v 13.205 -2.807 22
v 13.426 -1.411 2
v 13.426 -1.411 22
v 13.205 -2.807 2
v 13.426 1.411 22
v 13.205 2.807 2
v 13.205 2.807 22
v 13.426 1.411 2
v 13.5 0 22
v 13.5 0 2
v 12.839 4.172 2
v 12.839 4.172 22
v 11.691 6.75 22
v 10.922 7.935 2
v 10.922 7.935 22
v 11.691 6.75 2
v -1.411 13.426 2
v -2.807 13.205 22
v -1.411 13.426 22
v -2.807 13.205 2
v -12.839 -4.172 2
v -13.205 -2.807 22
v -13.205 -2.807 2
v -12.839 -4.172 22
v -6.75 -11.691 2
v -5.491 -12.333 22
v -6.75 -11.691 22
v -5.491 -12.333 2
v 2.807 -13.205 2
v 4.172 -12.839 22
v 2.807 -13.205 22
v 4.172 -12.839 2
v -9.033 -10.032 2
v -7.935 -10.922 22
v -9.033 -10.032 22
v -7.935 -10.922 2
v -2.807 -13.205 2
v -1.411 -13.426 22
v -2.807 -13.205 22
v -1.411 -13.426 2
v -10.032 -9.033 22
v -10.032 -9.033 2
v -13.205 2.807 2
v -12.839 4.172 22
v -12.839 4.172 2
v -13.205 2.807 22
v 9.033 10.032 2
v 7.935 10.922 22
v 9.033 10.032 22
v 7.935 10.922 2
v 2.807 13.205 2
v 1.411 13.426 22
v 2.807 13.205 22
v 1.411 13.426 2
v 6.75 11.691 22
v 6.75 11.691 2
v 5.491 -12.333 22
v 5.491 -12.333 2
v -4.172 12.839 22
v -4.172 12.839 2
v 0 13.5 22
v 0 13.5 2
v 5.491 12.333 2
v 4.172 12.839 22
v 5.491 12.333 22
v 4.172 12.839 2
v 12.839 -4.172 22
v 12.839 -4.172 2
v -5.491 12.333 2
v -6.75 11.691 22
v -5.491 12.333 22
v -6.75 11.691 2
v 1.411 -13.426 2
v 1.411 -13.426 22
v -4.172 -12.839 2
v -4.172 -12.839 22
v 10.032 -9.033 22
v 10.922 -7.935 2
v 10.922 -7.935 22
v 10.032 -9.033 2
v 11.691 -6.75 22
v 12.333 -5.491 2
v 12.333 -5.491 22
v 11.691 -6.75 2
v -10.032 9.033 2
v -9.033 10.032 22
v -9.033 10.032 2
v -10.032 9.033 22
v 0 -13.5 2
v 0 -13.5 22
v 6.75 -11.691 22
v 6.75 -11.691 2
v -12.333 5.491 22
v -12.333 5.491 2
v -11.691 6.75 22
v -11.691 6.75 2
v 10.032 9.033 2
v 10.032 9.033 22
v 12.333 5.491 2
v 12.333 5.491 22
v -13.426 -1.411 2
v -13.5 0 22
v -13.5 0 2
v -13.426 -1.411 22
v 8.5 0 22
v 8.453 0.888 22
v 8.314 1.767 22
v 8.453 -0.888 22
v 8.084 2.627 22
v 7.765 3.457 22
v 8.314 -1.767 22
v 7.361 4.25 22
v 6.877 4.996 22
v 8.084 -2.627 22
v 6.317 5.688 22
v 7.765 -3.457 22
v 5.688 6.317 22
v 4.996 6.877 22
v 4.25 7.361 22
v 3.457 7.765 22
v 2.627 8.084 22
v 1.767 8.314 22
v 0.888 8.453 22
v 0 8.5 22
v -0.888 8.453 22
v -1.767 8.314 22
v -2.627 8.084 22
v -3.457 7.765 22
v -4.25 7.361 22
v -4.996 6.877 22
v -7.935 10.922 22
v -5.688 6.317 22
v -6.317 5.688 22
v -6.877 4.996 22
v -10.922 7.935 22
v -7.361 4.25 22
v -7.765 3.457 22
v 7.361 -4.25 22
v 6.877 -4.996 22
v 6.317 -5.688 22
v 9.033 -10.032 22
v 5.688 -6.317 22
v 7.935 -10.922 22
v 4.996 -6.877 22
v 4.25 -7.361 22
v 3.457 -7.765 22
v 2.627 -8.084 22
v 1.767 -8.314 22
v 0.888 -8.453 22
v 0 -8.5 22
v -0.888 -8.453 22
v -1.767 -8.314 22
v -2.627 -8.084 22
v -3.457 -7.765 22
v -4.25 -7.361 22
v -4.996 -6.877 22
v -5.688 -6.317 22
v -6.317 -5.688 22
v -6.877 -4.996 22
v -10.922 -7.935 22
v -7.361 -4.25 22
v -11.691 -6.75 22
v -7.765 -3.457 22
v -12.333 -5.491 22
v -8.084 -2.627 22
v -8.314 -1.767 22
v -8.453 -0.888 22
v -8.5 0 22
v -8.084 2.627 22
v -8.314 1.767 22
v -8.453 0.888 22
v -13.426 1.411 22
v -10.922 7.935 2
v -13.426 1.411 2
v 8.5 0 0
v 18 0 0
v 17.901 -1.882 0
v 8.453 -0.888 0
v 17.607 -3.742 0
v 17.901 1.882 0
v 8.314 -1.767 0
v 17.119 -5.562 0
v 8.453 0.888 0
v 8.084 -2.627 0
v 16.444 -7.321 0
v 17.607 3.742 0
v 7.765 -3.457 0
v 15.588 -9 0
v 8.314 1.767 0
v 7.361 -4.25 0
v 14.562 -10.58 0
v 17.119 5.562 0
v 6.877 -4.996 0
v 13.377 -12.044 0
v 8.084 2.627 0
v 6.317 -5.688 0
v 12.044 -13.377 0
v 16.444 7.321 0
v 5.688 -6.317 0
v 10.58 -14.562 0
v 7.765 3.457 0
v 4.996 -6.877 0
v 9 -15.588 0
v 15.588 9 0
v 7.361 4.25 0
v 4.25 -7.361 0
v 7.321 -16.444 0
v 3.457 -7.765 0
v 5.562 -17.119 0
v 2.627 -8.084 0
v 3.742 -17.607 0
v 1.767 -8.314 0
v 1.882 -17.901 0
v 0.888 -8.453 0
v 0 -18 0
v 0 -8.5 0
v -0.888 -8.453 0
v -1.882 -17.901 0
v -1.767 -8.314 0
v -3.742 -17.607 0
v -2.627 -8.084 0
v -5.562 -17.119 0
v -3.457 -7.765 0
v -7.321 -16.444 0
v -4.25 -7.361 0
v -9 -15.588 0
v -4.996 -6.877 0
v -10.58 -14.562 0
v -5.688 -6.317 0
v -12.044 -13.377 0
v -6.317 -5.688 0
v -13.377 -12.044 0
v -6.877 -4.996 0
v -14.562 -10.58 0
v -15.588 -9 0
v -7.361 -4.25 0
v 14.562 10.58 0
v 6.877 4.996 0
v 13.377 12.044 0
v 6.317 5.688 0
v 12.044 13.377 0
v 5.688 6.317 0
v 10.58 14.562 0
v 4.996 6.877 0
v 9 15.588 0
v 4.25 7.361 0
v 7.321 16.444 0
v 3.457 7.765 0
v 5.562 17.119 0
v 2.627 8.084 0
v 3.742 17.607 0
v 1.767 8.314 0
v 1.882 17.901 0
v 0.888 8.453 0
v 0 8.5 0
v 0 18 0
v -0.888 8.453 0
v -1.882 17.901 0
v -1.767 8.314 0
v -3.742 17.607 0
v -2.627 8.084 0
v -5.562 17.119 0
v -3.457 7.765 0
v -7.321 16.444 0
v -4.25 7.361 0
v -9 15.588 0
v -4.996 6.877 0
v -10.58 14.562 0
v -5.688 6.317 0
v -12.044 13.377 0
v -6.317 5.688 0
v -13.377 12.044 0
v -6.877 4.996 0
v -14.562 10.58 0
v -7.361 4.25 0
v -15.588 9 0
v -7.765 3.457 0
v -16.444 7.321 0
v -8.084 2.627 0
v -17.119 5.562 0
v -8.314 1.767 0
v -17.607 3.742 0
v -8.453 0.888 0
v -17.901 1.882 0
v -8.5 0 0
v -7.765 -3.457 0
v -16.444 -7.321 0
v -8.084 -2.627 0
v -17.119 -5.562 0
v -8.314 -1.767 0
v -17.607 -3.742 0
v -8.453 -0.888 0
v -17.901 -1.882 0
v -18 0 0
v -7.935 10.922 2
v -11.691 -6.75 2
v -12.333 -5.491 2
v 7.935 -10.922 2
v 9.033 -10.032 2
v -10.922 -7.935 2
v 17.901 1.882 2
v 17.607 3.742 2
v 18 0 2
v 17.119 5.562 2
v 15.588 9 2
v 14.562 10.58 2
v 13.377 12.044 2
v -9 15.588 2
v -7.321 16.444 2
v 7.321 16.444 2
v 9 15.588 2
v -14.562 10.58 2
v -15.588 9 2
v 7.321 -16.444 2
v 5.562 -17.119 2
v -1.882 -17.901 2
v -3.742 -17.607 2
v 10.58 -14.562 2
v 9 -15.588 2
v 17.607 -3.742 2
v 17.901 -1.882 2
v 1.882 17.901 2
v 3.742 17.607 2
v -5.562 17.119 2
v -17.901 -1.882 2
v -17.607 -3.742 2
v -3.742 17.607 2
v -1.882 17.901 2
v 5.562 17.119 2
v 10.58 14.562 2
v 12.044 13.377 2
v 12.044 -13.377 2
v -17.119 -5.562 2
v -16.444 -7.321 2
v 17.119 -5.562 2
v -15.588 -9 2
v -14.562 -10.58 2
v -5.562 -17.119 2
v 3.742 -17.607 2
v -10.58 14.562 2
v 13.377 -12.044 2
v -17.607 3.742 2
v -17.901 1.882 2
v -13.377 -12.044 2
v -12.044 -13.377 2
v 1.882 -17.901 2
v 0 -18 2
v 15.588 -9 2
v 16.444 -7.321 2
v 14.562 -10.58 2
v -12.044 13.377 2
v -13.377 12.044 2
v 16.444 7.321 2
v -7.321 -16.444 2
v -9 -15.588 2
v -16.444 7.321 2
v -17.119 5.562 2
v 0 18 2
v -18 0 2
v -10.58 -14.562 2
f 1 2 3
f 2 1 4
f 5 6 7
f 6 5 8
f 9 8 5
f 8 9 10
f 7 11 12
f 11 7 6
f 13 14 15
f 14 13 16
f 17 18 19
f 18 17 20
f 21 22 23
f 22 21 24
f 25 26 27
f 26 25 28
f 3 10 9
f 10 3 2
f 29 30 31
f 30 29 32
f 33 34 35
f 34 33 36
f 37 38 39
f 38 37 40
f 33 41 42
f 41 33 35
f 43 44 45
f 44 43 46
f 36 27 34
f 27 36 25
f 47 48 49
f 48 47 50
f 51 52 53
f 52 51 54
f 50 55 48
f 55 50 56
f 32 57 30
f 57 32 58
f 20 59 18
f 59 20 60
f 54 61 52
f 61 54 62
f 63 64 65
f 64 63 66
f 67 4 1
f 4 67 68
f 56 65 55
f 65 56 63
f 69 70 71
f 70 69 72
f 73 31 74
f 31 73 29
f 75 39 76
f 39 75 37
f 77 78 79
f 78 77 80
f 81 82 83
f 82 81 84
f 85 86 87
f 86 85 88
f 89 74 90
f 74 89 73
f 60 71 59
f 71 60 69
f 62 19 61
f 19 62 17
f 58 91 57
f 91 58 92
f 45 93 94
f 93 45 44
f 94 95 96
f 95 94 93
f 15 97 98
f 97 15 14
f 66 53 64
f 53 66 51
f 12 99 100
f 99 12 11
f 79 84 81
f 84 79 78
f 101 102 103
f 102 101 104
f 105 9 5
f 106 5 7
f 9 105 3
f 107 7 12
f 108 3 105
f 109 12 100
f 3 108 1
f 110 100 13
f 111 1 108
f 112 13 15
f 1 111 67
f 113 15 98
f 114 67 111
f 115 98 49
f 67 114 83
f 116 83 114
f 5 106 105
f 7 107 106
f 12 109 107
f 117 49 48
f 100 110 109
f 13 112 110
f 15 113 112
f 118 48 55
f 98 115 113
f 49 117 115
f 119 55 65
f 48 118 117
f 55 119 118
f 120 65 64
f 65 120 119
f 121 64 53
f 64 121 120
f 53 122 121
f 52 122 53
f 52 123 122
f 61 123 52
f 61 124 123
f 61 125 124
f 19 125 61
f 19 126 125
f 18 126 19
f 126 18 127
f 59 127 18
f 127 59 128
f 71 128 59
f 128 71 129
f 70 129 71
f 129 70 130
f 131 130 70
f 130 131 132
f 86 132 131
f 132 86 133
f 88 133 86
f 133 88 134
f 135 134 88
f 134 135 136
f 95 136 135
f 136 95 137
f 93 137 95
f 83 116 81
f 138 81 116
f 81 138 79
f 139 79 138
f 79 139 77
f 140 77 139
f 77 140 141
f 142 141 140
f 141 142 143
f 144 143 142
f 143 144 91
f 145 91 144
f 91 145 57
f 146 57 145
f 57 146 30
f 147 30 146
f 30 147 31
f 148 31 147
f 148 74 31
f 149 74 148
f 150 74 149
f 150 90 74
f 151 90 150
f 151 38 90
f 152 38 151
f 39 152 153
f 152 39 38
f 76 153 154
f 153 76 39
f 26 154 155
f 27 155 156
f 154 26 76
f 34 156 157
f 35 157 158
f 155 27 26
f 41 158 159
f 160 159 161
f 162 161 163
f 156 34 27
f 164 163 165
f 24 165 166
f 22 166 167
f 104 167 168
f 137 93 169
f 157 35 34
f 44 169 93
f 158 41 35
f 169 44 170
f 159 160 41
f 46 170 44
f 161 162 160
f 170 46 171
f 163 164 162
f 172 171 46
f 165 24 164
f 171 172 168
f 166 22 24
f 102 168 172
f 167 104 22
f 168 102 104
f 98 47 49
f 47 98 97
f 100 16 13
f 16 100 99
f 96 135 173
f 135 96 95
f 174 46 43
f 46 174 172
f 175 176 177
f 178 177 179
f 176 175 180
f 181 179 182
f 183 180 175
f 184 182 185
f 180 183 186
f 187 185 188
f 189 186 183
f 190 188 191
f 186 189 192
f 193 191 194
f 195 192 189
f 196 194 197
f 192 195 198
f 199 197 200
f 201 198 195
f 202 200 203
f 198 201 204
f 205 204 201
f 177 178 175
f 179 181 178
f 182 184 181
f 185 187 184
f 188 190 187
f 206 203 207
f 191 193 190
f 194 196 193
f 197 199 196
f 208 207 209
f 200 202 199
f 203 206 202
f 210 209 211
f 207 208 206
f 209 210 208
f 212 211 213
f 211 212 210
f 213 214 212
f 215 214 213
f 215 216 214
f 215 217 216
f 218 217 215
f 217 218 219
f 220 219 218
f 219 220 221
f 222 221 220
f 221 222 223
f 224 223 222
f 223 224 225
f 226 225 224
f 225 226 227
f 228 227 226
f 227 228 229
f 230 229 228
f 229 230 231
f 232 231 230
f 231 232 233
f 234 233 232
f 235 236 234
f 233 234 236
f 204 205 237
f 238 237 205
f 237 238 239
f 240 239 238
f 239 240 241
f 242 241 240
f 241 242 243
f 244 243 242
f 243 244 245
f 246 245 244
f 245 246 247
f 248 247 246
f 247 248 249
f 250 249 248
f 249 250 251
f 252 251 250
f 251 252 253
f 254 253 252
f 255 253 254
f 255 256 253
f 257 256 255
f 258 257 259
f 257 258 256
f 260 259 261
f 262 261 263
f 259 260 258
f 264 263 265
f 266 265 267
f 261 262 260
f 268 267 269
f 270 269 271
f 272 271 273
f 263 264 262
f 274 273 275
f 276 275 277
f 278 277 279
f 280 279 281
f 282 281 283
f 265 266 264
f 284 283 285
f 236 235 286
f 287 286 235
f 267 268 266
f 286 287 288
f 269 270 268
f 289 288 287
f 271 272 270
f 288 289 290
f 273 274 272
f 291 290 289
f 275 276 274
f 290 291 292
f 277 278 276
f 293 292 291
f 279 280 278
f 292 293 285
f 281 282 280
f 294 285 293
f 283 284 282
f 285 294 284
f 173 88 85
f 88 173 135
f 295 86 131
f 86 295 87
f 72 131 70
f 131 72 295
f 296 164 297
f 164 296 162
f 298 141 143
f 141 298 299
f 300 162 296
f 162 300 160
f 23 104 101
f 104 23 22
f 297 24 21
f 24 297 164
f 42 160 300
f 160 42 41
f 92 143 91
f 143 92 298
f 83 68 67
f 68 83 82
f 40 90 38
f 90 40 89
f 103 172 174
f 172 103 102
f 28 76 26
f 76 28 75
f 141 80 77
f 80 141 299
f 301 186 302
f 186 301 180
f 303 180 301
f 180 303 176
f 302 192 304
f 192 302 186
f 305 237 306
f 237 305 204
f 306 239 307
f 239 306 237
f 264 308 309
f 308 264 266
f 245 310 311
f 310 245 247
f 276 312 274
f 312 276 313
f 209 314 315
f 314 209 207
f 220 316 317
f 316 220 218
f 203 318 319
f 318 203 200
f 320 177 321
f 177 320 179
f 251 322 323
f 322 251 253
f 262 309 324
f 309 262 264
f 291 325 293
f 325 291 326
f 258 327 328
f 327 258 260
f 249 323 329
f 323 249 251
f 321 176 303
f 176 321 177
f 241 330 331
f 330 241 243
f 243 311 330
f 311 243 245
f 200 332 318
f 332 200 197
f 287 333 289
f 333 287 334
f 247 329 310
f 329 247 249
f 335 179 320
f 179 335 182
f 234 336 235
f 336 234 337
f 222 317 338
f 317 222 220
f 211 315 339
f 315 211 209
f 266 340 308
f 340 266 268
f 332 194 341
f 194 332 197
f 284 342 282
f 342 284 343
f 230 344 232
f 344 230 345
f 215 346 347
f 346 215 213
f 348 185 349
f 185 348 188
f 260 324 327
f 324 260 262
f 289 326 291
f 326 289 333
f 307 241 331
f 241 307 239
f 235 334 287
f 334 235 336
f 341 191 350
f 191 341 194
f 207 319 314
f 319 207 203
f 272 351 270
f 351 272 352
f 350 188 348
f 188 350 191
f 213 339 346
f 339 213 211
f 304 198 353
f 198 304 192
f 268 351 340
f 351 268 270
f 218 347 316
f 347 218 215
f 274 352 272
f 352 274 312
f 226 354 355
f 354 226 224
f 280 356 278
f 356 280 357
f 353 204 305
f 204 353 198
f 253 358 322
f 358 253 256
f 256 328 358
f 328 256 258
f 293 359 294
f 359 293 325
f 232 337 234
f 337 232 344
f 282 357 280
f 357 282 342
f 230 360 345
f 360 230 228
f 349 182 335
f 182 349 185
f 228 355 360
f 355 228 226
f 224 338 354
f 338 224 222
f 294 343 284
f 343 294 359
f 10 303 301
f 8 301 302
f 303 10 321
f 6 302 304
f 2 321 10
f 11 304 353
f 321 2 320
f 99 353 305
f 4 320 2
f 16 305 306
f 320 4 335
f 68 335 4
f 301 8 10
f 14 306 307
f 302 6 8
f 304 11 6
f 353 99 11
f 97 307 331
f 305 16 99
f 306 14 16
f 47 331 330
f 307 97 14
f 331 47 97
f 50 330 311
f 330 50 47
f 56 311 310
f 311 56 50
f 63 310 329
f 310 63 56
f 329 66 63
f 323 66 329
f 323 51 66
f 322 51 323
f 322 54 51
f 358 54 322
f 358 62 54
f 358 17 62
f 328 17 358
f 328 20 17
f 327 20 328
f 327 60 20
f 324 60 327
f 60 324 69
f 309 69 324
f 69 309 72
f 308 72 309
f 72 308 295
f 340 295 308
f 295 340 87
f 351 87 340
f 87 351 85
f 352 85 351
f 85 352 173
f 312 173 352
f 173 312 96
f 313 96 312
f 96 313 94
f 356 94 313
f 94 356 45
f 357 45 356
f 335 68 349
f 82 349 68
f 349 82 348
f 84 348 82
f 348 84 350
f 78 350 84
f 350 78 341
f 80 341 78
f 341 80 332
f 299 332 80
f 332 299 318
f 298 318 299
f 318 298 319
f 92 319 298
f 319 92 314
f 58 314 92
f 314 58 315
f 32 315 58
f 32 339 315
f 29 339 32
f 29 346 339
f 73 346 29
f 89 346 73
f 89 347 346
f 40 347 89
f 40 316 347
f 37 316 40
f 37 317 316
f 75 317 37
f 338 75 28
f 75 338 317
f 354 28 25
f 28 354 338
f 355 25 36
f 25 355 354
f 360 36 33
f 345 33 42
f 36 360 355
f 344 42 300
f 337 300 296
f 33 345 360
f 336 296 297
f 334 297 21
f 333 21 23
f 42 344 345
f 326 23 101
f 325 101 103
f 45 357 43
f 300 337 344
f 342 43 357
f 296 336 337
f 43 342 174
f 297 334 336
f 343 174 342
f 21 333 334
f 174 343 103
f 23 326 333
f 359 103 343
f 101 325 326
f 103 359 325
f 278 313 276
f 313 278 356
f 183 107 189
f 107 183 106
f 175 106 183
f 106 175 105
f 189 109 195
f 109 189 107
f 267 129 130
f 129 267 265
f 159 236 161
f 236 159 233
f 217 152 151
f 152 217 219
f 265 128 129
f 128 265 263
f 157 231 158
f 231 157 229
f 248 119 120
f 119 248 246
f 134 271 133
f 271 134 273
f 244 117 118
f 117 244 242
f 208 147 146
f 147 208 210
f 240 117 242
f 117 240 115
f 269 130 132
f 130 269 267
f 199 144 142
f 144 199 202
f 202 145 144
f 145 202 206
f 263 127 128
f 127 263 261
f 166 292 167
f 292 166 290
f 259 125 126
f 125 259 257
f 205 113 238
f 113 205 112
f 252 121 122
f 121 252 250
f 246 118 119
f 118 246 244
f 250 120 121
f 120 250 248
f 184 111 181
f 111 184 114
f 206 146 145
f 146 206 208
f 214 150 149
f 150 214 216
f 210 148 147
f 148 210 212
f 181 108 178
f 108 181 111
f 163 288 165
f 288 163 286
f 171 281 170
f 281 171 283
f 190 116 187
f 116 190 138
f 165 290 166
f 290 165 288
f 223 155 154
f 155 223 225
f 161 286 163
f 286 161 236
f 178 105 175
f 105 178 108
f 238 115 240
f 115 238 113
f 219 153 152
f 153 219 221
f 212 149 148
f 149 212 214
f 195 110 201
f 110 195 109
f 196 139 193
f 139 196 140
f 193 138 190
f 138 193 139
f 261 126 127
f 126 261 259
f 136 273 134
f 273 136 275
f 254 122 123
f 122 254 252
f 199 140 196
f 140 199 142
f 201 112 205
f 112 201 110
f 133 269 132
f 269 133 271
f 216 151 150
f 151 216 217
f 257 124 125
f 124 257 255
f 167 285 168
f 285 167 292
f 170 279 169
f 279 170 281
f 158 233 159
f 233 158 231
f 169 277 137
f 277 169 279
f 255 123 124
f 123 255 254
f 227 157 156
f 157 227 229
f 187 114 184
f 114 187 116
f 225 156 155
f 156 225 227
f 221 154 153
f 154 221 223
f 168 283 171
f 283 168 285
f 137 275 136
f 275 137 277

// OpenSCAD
// Rivet nut / nutsert.
$fn = 60;
eps = 0.02;
thread_d = 17;
outer_d = 27;
length = 22;
flange_d = 36;
difference() { union() { cylinder(d=max(outer_d, thread_d+3),h=length); cylinder(d=max(flange_d, thread_d+6),h=2); } translate([0,0,-eps]) cylinder(d=thread_d,h=length+2*eps); }
